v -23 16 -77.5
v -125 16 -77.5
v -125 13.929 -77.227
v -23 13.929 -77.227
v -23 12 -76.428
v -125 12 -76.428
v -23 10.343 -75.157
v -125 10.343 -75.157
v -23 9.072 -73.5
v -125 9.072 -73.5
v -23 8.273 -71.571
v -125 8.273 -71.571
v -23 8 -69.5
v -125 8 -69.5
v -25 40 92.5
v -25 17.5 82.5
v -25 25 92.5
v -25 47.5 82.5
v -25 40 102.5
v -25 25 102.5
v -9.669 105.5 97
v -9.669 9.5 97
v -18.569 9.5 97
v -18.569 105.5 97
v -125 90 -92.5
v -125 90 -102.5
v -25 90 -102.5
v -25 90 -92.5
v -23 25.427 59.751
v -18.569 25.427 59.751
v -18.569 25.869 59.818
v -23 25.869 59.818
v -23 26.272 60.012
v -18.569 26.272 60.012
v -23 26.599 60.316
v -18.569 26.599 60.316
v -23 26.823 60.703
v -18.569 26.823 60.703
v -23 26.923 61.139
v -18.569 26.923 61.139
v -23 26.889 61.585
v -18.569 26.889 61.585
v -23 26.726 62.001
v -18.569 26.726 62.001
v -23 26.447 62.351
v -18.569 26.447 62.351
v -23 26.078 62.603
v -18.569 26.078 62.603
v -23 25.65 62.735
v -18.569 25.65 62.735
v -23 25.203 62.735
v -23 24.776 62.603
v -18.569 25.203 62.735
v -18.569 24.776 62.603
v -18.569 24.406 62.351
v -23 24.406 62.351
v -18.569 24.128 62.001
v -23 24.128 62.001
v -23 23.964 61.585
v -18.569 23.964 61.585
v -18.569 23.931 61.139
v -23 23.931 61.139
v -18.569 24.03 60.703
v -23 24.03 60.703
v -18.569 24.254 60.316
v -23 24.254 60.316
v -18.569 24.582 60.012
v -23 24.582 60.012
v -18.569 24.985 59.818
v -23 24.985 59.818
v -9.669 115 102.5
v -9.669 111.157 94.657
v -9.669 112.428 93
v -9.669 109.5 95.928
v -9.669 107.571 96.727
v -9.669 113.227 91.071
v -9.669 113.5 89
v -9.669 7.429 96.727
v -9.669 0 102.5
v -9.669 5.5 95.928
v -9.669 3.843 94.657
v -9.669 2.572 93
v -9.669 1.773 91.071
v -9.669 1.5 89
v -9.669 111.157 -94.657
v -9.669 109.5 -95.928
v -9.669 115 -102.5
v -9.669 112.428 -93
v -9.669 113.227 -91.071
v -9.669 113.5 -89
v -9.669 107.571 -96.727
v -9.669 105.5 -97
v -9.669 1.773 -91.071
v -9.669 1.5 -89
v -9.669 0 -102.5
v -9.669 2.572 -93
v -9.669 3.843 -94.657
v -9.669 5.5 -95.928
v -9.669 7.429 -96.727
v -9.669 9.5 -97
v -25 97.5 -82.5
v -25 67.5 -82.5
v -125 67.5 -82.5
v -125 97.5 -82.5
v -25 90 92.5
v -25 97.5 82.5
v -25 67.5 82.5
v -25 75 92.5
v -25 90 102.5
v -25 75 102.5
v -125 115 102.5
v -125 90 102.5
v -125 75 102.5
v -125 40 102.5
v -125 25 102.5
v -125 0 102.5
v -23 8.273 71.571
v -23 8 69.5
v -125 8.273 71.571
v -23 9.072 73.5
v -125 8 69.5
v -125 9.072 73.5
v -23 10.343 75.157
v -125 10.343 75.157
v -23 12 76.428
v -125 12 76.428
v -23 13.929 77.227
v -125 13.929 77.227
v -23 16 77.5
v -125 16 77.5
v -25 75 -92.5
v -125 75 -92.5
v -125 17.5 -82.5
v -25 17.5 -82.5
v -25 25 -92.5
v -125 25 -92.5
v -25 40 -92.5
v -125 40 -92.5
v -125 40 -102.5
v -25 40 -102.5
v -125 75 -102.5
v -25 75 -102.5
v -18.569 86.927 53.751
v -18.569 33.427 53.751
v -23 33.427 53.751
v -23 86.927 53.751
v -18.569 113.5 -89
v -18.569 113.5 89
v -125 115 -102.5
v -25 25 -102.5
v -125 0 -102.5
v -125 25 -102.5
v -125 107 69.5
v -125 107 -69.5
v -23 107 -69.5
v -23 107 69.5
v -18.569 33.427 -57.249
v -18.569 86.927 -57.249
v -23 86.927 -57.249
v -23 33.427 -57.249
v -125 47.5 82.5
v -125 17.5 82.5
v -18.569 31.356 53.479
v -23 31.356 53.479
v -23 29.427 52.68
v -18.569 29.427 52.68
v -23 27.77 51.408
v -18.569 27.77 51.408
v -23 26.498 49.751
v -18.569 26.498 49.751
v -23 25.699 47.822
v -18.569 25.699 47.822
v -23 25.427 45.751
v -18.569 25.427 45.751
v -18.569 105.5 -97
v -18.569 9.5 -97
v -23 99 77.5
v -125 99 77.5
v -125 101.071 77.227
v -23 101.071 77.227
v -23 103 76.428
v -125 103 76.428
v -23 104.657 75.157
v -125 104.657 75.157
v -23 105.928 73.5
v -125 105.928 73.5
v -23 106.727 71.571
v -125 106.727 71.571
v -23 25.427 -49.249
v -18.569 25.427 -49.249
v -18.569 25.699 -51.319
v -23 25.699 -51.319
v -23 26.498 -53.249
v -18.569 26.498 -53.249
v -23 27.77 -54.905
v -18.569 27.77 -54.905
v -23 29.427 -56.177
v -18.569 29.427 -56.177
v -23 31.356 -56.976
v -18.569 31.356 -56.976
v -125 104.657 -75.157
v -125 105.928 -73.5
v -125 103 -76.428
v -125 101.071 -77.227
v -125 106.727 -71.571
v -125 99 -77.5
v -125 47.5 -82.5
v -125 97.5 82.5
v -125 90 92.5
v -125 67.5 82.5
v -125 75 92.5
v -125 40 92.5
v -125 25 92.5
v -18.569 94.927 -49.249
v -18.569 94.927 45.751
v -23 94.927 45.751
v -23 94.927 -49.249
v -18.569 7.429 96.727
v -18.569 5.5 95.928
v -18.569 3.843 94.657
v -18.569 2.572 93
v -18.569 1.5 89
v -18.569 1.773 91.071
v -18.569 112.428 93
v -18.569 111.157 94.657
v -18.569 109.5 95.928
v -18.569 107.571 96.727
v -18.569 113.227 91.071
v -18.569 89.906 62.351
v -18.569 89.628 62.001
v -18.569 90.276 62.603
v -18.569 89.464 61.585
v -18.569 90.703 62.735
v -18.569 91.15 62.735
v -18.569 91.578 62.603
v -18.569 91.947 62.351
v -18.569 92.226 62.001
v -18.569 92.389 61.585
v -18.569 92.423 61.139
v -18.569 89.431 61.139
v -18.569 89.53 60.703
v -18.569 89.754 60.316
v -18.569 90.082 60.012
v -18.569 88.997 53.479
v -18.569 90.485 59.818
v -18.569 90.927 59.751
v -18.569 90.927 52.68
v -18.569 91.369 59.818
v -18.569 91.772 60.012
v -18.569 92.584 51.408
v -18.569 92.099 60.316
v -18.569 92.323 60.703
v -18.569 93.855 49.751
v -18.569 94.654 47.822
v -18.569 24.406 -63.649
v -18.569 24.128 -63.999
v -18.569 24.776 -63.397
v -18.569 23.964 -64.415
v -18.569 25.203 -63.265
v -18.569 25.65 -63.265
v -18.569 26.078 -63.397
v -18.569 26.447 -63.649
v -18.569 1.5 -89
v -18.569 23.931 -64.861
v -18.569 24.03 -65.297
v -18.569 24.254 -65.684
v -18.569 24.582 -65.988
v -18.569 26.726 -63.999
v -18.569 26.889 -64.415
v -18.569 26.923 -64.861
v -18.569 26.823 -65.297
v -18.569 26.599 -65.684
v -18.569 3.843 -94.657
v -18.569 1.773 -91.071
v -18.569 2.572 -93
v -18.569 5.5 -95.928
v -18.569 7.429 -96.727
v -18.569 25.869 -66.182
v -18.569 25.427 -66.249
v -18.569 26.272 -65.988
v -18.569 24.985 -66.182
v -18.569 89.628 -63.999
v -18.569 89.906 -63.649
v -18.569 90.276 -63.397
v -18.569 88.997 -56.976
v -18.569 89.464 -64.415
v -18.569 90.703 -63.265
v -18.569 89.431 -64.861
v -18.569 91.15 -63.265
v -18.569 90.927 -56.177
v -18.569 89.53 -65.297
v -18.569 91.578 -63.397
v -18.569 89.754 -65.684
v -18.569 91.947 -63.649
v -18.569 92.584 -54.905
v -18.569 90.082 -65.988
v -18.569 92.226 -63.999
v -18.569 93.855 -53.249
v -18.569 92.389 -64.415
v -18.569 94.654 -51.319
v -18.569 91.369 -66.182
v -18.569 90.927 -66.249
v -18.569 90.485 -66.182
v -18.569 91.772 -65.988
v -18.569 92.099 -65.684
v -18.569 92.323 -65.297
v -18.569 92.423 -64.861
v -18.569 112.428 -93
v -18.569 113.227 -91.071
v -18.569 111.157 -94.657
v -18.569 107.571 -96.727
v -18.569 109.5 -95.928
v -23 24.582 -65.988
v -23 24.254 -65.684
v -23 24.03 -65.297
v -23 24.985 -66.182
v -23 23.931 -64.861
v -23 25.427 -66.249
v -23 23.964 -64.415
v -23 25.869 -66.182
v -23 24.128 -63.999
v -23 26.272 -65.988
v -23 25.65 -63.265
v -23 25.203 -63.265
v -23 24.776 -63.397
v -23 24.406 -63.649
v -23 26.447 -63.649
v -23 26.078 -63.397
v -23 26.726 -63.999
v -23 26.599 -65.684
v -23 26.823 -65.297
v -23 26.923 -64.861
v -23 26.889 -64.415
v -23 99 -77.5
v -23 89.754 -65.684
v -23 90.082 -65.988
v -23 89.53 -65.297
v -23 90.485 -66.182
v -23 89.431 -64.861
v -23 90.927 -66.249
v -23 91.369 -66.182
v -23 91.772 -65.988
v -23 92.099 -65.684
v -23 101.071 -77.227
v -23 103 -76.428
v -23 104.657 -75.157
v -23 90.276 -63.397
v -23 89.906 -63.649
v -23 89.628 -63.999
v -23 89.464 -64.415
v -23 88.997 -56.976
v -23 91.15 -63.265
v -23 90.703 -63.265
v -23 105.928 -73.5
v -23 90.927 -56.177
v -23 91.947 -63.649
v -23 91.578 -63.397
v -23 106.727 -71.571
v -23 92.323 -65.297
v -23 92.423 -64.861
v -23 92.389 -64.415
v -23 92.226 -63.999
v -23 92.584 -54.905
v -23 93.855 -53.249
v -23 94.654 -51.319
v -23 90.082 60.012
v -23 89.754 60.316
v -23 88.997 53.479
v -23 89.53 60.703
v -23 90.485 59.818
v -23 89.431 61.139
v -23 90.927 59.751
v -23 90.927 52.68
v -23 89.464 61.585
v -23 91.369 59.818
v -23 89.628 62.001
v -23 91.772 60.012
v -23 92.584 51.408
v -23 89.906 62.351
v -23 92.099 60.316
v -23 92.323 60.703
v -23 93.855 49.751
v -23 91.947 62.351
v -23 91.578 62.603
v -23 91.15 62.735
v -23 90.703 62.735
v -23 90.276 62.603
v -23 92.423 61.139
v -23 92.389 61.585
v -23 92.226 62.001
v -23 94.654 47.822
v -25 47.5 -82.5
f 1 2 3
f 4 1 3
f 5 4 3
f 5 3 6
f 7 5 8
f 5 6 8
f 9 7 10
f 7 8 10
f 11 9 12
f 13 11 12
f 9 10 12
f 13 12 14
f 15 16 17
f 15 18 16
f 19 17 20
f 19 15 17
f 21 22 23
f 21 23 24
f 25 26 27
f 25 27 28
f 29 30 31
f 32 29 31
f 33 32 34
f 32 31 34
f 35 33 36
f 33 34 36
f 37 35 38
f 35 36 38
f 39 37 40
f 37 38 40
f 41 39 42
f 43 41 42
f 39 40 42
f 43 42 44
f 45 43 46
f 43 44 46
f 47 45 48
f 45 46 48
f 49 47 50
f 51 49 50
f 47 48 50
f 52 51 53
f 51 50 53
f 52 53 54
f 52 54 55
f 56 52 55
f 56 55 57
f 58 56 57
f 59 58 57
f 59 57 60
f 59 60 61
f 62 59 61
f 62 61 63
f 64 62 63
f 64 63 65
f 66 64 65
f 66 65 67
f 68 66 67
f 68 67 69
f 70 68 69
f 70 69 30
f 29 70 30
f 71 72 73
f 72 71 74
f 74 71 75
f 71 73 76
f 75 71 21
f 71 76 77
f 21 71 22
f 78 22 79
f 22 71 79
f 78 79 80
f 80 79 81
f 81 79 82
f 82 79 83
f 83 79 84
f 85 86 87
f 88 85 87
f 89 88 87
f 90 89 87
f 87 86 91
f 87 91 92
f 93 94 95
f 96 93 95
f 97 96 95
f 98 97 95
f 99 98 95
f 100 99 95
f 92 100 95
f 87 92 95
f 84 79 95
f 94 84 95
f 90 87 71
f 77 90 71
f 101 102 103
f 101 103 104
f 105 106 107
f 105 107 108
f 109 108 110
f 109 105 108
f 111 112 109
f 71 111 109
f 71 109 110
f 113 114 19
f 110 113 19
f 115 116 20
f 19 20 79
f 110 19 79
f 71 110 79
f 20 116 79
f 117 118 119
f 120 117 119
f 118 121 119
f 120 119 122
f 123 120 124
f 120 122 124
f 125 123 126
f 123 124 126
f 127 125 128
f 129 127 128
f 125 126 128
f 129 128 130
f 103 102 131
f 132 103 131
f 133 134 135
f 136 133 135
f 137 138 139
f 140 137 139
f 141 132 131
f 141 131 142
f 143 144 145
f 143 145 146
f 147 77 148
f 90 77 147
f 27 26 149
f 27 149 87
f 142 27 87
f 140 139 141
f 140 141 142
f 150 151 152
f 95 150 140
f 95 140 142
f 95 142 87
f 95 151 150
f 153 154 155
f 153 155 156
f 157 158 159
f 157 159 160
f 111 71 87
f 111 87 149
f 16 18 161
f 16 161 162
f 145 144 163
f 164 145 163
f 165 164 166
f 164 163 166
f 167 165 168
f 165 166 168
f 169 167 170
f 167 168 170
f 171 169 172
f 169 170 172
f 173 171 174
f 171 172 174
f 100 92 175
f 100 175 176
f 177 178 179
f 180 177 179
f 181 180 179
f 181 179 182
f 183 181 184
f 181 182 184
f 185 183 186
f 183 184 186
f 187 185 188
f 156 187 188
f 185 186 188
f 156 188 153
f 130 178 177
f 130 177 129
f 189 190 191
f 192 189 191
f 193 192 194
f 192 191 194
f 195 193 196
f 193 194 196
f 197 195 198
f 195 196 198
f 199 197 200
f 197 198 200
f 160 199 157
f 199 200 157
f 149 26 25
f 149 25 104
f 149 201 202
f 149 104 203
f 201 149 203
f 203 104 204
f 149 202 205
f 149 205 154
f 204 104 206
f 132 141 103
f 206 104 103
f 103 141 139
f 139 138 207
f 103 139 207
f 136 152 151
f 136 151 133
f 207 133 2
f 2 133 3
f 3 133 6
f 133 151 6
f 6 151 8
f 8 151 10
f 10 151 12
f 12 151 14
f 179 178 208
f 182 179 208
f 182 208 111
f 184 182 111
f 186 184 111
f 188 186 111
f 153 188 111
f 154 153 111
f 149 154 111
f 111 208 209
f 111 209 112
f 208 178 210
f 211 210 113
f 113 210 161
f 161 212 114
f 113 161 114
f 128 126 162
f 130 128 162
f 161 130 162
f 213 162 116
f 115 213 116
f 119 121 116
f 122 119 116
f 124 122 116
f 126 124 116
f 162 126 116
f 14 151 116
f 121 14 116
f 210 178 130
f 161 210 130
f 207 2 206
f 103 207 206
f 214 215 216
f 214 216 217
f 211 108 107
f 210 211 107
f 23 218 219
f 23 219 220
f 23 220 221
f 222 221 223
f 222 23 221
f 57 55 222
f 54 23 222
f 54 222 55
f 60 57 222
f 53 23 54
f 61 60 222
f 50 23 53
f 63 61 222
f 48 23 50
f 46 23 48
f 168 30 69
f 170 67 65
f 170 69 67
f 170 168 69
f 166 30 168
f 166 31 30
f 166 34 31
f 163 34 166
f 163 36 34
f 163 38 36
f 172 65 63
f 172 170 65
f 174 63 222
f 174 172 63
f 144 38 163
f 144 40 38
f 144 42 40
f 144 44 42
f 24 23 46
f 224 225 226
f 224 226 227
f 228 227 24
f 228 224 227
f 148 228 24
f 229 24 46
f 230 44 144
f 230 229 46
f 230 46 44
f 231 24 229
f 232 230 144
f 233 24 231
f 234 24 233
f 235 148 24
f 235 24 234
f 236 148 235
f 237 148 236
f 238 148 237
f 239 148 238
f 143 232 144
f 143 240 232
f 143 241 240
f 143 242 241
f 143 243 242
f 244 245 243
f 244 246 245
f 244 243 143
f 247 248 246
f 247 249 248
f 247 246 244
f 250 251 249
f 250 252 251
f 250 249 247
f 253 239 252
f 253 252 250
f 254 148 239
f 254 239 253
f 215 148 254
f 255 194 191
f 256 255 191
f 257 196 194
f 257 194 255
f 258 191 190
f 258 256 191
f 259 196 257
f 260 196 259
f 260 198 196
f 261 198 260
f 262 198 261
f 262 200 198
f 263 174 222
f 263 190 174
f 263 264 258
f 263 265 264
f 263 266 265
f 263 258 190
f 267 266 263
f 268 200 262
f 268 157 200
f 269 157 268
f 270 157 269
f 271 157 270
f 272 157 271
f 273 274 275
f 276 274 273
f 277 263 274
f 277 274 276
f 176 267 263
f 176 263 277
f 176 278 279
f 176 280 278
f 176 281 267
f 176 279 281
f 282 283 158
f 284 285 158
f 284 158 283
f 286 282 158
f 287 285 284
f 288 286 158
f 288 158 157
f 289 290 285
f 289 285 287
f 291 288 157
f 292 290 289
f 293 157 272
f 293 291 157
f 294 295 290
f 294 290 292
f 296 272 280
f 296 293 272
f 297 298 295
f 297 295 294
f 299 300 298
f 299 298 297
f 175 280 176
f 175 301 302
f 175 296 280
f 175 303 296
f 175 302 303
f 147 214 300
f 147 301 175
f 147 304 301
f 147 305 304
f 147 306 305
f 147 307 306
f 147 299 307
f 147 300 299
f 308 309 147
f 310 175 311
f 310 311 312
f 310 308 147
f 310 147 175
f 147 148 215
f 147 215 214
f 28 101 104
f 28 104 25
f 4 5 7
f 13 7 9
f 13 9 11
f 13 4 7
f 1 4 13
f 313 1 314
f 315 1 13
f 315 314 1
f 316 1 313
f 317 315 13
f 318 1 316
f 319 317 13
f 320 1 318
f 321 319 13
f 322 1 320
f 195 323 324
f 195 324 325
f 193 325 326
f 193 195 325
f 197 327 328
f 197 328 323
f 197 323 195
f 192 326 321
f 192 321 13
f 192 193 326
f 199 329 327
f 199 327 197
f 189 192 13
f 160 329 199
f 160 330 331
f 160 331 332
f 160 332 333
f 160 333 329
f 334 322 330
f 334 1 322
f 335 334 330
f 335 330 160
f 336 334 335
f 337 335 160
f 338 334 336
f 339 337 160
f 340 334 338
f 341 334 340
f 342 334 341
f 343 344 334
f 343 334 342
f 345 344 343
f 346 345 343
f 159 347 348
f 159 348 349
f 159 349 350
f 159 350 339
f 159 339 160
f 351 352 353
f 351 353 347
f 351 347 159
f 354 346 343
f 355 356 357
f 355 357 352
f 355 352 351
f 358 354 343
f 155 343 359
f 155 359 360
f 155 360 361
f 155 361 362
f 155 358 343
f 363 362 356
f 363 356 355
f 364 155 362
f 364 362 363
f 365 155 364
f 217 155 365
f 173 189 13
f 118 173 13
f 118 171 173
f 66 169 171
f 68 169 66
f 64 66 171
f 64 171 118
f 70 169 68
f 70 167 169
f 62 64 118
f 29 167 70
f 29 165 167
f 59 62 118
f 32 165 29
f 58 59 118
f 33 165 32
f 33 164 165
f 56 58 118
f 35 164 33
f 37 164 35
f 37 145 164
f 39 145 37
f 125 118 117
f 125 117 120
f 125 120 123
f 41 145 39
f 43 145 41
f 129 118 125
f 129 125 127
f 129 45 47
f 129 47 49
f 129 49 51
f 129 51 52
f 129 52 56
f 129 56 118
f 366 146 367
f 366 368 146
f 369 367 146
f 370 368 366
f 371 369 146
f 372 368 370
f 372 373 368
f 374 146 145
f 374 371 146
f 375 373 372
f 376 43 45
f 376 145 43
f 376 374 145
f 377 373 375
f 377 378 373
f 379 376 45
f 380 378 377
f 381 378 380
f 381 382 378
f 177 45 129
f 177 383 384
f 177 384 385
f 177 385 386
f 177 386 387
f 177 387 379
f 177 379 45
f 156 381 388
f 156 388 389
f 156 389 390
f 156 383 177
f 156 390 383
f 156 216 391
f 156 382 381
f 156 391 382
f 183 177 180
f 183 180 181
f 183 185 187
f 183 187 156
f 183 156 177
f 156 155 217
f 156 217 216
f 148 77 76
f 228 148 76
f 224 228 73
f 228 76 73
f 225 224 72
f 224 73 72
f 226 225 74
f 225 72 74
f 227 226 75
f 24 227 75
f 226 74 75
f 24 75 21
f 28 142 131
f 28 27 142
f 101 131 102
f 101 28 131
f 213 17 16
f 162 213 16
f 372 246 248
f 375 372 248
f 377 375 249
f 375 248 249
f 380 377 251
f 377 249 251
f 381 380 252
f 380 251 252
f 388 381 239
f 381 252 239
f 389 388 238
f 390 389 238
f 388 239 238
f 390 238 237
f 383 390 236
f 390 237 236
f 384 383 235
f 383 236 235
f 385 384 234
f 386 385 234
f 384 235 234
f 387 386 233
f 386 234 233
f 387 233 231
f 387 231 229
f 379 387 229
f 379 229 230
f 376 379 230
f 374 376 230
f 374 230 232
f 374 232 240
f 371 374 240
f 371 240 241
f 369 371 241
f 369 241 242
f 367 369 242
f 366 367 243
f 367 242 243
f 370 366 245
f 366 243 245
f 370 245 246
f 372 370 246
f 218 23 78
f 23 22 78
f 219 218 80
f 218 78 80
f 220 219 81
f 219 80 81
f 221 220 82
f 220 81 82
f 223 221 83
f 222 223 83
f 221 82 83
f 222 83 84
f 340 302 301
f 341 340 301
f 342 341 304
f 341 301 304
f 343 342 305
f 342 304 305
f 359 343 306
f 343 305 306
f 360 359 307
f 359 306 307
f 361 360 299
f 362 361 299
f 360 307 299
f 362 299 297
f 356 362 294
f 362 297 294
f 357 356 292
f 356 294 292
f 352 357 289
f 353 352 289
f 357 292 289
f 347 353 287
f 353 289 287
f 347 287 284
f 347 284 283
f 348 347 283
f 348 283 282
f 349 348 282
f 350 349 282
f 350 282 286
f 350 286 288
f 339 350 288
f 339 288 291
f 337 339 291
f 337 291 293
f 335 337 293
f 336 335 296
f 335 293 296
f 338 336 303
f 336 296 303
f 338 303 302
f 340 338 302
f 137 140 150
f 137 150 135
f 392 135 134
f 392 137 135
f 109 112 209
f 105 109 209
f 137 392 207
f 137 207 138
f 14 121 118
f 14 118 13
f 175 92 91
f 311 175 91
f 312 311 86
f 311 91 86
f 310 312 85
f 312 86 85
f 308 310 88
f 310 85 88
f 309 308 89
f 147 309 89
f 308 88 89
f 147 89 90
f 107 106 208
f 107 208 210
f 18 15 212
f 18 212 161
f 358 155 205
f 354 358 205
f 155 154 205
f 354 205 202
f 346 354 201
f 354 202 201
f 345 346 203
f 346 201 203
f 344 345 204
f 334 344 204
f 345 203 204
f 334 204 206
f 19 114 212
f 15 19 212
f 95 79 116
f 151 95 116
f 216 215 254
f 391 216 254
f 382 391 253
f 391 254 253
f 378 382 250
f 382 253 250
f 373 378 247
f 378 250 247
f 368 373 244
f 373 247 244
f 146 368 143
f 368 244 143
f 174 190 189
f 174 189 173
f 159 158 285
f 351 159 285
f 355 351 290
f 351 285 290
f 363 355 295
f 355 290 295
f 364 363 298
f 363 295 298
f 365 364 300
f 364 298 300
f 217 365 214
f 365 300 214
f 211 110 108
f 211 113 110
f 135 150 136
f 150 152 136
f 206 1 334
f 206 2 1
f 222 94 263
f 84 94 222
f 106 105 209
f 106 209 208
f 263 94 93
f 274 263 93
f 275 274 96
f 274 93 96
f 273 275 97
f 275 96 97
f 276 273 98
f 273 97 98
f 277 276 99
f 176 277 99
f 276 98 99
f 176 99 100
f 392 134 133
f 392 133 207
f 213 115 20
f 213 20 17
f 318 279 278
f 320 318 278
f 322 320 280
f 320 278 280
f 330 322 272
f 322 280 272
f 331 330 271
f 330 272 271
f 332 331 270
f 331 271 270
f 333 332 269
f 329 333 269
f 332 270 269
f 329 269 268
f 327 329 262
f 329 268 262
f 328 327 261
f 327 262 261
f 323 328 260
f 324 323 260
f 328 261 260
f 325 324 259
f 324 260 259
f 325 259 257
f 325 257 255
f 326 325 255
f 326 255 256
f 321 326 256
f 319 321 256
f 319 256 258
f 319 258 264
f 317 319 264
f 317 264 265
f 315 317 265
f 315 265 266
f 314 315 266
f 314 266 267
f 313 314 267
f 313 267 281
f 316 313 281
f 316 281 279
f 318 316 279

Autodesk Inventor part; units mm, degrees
ref_plane "YZ Plane" through (0, 0, 0) normal (1, 0, 0) x (0, 1, 0)
ref_plane "XZ Plane" through (0, 0, 0) normal (0, 1, 0) x (-1, 0, 0)
ref_plane "XY Plane" through (0, 0, 0) normal (0, 0, 1) x (1, 0, 0)
sketch "Sketch12" plane through (0, 0, 0) normal (0, 1, 0) x (-1, 0, 0)
  line L0 (0, 0) -> (0, -102.5) construction
  line L1 (0, 0) -> (0, 102.5) construction
  line L2 (0, 102.5) -> (125, 102.5) construction
  line L3 (125, 102.5) -> (125, -102.5) construction
  line L4 (125, -102.5) -> (0, -102.5) construction
  line L5 (0, -102.5) -> (0, 102.5) construction
  line L6 (0, 102.5) -> (45, 102.5) construction
  line L7 (45, 102.5) -> (45, -102.5) construction
  line L8 (45, -102.5) -> (0, -102.5) construction
  line L9 (0, -102.5) -> (0, 102.5) construction
  line L10 (125, 0) -> (125, -217.5) construction
  line L11 (125, 0) -> (125, 217.5) construction
  line L12 (125, 217.5) -> (72.0108, 217.5) construction
  line L13 (45, 217.5) -> (45, 102.5) construction
  line L14 (125, -217.5) -> (72.0108, -217.5) construction
  line L15 (45, -217.5) -> (45, -102.5) construction
  arc A0 (34.5307, 191.4729) -> (34.5307, -191.4729) centre (548.125, 0) ccw construction
  arc A1 (34.5307, -191.4729) -> (72.0108, -217.5) centre (72.0108, -177.5) ccw construction
  arc A2 (72.0108, 217.5) -> (34.5307, 191.4729) centre (72.0108, 177.5) ccw construction
  line L16 (125, -102.5) -> (125, 102.5)
  line L17 (125, 102.5) -> (9.6691, 102.5)
  line L18 (125, -102.5) -> (9.6691, -102.5)
  arc A3 (9.6691, 102.5) -> (9.6691, -102.5) centre (548.125, 0) ccw construction
  line L19 (9.6691, 102.5) -> (9.6691, -102.5)
  dimension "d698" = 102.5
  dimension "d699" = 102.5
  dimension "d700" = 125
  dimension "d701" = 45
  dimension "d702" = 217.5
  dimension "d703" = 217.5
  dimension "d704" = 40
extrude "Extrusion12" add sketch "Sketch12" along normal blind 115
sketch "Sketch84" plane through (-125, 0, -102.5) normal (-1, 0, 0) x (0, 0, 1)
  line L0 (33, 107) -> (172, 107)
  line L1 (180, 99) -> (180, 16)
  line L2 (172, 8) -> (33, 8)
  line L3 (25, 16) -> (25, 99)
  line L4 (205, 0) -> (205, 115) projected
  line L5 (0, 0) -> (0, 115) projected
  line L6 (0, 115) -> (205, 115) projected
  line L7 (0, 0) -> (205, 0) projected
  arc A0 (33, 107) -> (25, 99) centre (33, 99) ccw
  arc A1 (180, 99) -> (172, 107) centre (172, 99) ccw
  arc A2 (172, 8) -> (180, 16) centre (172, 16) ccw
  arc A3 (25, 16) -> (33, 8) centre (33, 16) ccw
  point P0 (102.5, 0)
  dimension "d705" = 25
  dimension "d706" = 25
  dimension "d707" = 8
  dimension "d708" = 8
  dimension "d709" = 8
extrude "Extrusion69" cut sketch "Sketch84" against normal blind 102 contours L0 A1 L1 A2 L2 A3 L3 A0
sketch "Sketch85" plane through (-125, 0, -102.5) normal (-1, 0, 0) x (0, 0, 1)
  line L0 (205, 0) -> (205, 97) projected
  line L1 (205, 25) -> (205, 40)
  line L2 (205, 32.5) -> (185, 32.5) construction
  line L3 (185, 32.5) -> (185, 47.5)
  line L4 (185, 32.5) -> (185, 17.5)
  line L5 (205, 40) -> (195, 40)
  line L6 (195, 40) -> (185, 47.5)
  line L7 (205, 25) -> (195, 25)
  line L8 (195, 25) -> (185, 17.5)
  line L9 (0, 0) -> (205, 0) projected
  line L10 (205, 75) -> (205, 90)
  line L11 (205, 82.5) -> (185, 82.5) construction
  line L12 (185, 82.5) -> (185, 97.5)
  line L13 (185, 82.5) -> (185, 67.5)
  line L14 (205, 75) -> (195, 75)
  line L15 (195, 75) -> (185, 67.5)
  line L16 (205, 90) -> (195, 90)
  line L17 (195, 90) -> (185, 97.5)
  line L18 (0, 115) -> (205, 115) projected
  line L19 (0, 0) -> (0, 115) projected
  line L20 (0, 25) -> (10, 25)
  line L21 (0, 25) -> (10, 25) construction
  line L22 (0, 25) -> (0, 40)
  line L23 (10, 40) -> (0, 40)
  line L24 (0, 32.5) -> (20, 32.5) construction
  line L25 (20, 32.5) -> (20, 47.5)
  line L26 (20, 47.5) -> (10, 40)
  line L27 (20, 32.5) -> (20, 17.5)
  line L28 (20, 17.5) -> (10, 25)
  line L29 (0, 90) -> (10, 90)
  line L30 (0, 90) -> (0, 75)
  line L31 (10, 75) -> (0, 75)
  line L32 (0, 82.5) -> (20, 82.5) construction
  line L33 (20, 82.5) -> (20, 97.5)
  line L34 (20, 97.5) -> (10, 90)
  line L35 (20, 82.5) -> (20, 67.5)
  line L36 (20, 67.5) -> (10, 75)
  point P0 (102.5, 0)
  dimension "d712" = 15
  dimension "d713" = 20
  dimension "d714" = 15
  dimension "d715" = 15
  dimension "d717" = 10
  dimension "d718" = 25
  dimension "d719" = 15
  dimension "d720" = 20
  dimension "d721" = 15
  dimension "d722" = 15
  dimension "d723" = 10
  dimension "d728" = 25
  dimension "d732" = 10
  dimension "d734" = 20
  dimension "d735" = 15
  dimension "d736" = 15
extrude "Extrusion70" cut sketch "Sketch85" against normal blind 100
sketch "Sketch86" plane through (-9.6691, 0, 102.5) normal (1, 0, 0) x (0, 0, -1)
  line L0 (0, 90) -> (0, 115) construction
  line L1 (0, 0) -> (205, 0) construction
  line L2 (0, 115) -> (205, 0) construction
  line L3 (0, 115) -> (205, 115) construction
  line L4 (205, 115) -> (0, 0) construction
  line L5 (191.5, 1.5) -> (13.5, 1.5)
  line L6 (5.5, 9.5) -> (5.5, 105.5)
  line L7 (13.5, 113.5) -> (191.5, 113.5)
  line L8 (199.5, 105.5) -> (199.5, 9.5)
  line L9 (199.5, 1.5) -> (5.5, 113.5) construction
  line L10 (5.5, 1.5) -> (199.5, 113.5) construction
  arc A0 (13.5, 113.5) -> (5.5, 105.5) centre (13.5, 105.5) ccw
  arc A1 (199.5, 105.5) -> (191.5, 113.5) centre (191.5, 105.5) ccw
  arc A2 (191.5, 1.5) -> (199.5, 9.5) centre (191.5, 9.5) ccw
  arc A3 (5.5, 9.5) -> (13.5, 1.5) centre (13.5, 9.5) ccw
  point P0 (102.5, 0)
  point P1 (102.5, 57.5)
  dimension "d738" = 194
  dimension "d739" = 112
  dimension "d740" = 8
extrude "Extrusion71" cut sketch "Sketch86" against normal blind 8.9
sketch "Sketch90" plane through (-18.5691, 0, 102.5) normal (1, 0, 0) x (0, 0, -1)
  circle A0 centre (41.2486, 90.9267) radius 1.5
  circle A1 centre (167.2486, 25.4267) radius 1.5
  circle A2 centre (41.2486, 25.4267) radius 1.5
  circle A3 centre (167.2486, 90.9267) radius 1.5
  line L0 (198.9986, 106.9003) -> (198.9986, 7.9003)
  line L1 (190.9986, 1.9267) -> (13.9986, 1.9267) construction
  line L2 (5.9986, 9.9267) -> (5.9986, 104.9267) construction
  line L3 (13.9986, 112.9267) -> (190.9986, 112.9267) construction
  line L4 (198.9986, 104.9267) -> (198.9986, 9.9267) construction
  arc A4 (13.9986, 112.9267) -> (5.9986, 104.9267) centre (13.9986, 104.9267) ccw
  arc A5 (198.9986, 104.9267) -> (190.9986, 112.9267) centre (190.9986, 104.9267) ccw
  arc A6 (190.9986, 1.9267) -> (198.9986, 9.9267) centre (190.9986, 9.9267) ccw
  arc A7 (5.9986, 9.9267) -> (13.9986, 1.9267) centre (13.9986, 9.9267) ccw
  line L5 (21.3986, 106.3267) -> (186.7486, 106.3267) construction
  line L6 (186.7486, 106.3267) -> (186.7486, 5.5767) construction
  line L7 (186.7486, 5.5767) -> (21.3986, 5.5767) construction
  line L8 (21.3986, 5.5767) -> (21.3986, 106.3267) construction
  line L9 (33.7486, 94.9267) -> (48.7486, 94.9267) construction
  line L10 (48.7486, 94.9267) -> (48.7486, 86.9267) construction
  line L11 (48.7486, 86.9267) -> (33.7486, 86.9267) construction
  line L12 (33.7486, 86.9267) -> (33.7486, 94.9267) construction
  line L13 (33.7486, 94.9267) -> (48.7486, 86.9267) construction
  line L14 (48.7486, 94.9267) -> (33.7486, 86.9267) construction
  line L15 (33.7486, 29.4267) -> (48.7486, 29.4267) construction
  line L16 (48.7486, 29.4267) -> (48.7486, 21.4267) construction
  line L17 (48.7486, 21.4267) -> (33.7486, 21.4267) construction
  line L18 (33.7486, 21.4267) -> (33.7486, 29.4267) construction
  line L19 (33.7486, 29.4267) -> (48.7486, 21.4267) construction
  line L20 (48.7486, 29.4267) -> (33.7486, 21.4267) construction
  line L21 (159.7486, 29.4267) -> (174.7486, 29.4267) construction
  line L22 (174.7486, 29.4267) -> (174.7486, 21.4267) construction
  line L23 (174.7486, 21.4267) -> (159.7486, 21.4267) construction
  line L24 (159.7486, 21.4267) -> (159.7486, 29.4267) construction
  line L25 (159.7486, 29.4267) -> (174.7486, 21.4267) construction
  line L26 (174.7486, 29.4267) -> (159.7486, 21.4267) construction
  line L27 (159.7486, 94.9267) -> (174.7486, 94.9267) construction
  line L28 (174.7486, 94.9267) -> (174.7486, 86.9267) construction
  line L29 (174.7486, 86.9267) -> (159.7486, 86.9267) construction
  line L30 (159.7486, 86.9267) -> (159.7486, 88.953) construction
  line L31 (159.7486, 94.9267) -> (174.7486, 86.9267) construction
  line L32 (174.7486, 94.9267) -> (159.7486, 86.9267) construction
  line L33 (159.7486, 94.9267) -> (159.7486, 84.9003) construction
  line L34 (56.7486, 94.9267) -> (151.7486, 94.9267)
  line L35 (159.7486, 86.9267) -> (159.7486, 33.4267)
  line L36 (151.7486, 25.4267) -> (56.7486, 25.4267)
  line L37 (48.7486, 33.4267) -> (48.7486, 86.9267)
  arc A8 (56.7486, 94.9267) -> (48.7486, 86.9267) centre (56.7486, 86.9267) ccw
  arc A9 (159.7486, 86.9267) -> (151.7486, 94.9267) centre (151.7486, 86.9267) ccw
  arc A10 (151.7486, 25.4267) -> (159.7486, 33.4267) centre (151.7486, 33.4267) ccw
  arc A11 (48.7486, 33.4267) -> (56.7486, 25.4267) centre (56.7486, 33.4267) ccw
  line L38 (0, 90) -> (0, 115) construction
  line L39 (205, 0) -> (205, 25) construction
  line L40 (0, 115) -> (205, 0) construction
  line L41 (205, 0) -> (205, 115) construction
  line L42 (0, 0) -> (0, 115) construction
  line L43 (0, 0) -> (205, 115) construction
  point P0 (102.5, 0)
  point P1 (5.9986, 112.9267)
  point P2 (5.9986, 1.9267)
  point P3 (198.9986, 112.9267)
  point P4 (159.7486, 25.4267)
  point P5 (102.4986, 57.5003)
  dimension "d840" = 3
  dimension "d841" = 3
  dimension "d842" = 3
  dimension "d843" = 3
  dimension "d844" = 193
  dimension "d845" = 111
  dimension "d846" = 8
  dimension "d847" = 8
  dimension "d848" = 165.35
  dimension "d849" = 100.75
  dimension "d850" = 3.65
  dimension "d851" = 15.4
  dimension "d852" = 15.4
  dimension "d853" = 19.85
  dimension "d854" = 19.85
  dimension "d855" = 15
  dimension "d856" = 8
  dimension "d857" = 15
  dimension "d858" = 15
  dimension "d859" = 8
  dimension "d860" = 19.5
  dimension "d861" = 19.85
  dimension "d862" = 19.5
  dimension "d863" = 19.85
  dimension "d864" = 12.25
  dimension "d865" = 0
  dimension "d866" = 8
  dimension "d868" = 15.4
  dimension "d869" = 6.6
  dimension "d870" = 12.25
extrude "Extrusion74" cut sketch "Sketch90" against normal blind 10
properties part number "center_fp13"
